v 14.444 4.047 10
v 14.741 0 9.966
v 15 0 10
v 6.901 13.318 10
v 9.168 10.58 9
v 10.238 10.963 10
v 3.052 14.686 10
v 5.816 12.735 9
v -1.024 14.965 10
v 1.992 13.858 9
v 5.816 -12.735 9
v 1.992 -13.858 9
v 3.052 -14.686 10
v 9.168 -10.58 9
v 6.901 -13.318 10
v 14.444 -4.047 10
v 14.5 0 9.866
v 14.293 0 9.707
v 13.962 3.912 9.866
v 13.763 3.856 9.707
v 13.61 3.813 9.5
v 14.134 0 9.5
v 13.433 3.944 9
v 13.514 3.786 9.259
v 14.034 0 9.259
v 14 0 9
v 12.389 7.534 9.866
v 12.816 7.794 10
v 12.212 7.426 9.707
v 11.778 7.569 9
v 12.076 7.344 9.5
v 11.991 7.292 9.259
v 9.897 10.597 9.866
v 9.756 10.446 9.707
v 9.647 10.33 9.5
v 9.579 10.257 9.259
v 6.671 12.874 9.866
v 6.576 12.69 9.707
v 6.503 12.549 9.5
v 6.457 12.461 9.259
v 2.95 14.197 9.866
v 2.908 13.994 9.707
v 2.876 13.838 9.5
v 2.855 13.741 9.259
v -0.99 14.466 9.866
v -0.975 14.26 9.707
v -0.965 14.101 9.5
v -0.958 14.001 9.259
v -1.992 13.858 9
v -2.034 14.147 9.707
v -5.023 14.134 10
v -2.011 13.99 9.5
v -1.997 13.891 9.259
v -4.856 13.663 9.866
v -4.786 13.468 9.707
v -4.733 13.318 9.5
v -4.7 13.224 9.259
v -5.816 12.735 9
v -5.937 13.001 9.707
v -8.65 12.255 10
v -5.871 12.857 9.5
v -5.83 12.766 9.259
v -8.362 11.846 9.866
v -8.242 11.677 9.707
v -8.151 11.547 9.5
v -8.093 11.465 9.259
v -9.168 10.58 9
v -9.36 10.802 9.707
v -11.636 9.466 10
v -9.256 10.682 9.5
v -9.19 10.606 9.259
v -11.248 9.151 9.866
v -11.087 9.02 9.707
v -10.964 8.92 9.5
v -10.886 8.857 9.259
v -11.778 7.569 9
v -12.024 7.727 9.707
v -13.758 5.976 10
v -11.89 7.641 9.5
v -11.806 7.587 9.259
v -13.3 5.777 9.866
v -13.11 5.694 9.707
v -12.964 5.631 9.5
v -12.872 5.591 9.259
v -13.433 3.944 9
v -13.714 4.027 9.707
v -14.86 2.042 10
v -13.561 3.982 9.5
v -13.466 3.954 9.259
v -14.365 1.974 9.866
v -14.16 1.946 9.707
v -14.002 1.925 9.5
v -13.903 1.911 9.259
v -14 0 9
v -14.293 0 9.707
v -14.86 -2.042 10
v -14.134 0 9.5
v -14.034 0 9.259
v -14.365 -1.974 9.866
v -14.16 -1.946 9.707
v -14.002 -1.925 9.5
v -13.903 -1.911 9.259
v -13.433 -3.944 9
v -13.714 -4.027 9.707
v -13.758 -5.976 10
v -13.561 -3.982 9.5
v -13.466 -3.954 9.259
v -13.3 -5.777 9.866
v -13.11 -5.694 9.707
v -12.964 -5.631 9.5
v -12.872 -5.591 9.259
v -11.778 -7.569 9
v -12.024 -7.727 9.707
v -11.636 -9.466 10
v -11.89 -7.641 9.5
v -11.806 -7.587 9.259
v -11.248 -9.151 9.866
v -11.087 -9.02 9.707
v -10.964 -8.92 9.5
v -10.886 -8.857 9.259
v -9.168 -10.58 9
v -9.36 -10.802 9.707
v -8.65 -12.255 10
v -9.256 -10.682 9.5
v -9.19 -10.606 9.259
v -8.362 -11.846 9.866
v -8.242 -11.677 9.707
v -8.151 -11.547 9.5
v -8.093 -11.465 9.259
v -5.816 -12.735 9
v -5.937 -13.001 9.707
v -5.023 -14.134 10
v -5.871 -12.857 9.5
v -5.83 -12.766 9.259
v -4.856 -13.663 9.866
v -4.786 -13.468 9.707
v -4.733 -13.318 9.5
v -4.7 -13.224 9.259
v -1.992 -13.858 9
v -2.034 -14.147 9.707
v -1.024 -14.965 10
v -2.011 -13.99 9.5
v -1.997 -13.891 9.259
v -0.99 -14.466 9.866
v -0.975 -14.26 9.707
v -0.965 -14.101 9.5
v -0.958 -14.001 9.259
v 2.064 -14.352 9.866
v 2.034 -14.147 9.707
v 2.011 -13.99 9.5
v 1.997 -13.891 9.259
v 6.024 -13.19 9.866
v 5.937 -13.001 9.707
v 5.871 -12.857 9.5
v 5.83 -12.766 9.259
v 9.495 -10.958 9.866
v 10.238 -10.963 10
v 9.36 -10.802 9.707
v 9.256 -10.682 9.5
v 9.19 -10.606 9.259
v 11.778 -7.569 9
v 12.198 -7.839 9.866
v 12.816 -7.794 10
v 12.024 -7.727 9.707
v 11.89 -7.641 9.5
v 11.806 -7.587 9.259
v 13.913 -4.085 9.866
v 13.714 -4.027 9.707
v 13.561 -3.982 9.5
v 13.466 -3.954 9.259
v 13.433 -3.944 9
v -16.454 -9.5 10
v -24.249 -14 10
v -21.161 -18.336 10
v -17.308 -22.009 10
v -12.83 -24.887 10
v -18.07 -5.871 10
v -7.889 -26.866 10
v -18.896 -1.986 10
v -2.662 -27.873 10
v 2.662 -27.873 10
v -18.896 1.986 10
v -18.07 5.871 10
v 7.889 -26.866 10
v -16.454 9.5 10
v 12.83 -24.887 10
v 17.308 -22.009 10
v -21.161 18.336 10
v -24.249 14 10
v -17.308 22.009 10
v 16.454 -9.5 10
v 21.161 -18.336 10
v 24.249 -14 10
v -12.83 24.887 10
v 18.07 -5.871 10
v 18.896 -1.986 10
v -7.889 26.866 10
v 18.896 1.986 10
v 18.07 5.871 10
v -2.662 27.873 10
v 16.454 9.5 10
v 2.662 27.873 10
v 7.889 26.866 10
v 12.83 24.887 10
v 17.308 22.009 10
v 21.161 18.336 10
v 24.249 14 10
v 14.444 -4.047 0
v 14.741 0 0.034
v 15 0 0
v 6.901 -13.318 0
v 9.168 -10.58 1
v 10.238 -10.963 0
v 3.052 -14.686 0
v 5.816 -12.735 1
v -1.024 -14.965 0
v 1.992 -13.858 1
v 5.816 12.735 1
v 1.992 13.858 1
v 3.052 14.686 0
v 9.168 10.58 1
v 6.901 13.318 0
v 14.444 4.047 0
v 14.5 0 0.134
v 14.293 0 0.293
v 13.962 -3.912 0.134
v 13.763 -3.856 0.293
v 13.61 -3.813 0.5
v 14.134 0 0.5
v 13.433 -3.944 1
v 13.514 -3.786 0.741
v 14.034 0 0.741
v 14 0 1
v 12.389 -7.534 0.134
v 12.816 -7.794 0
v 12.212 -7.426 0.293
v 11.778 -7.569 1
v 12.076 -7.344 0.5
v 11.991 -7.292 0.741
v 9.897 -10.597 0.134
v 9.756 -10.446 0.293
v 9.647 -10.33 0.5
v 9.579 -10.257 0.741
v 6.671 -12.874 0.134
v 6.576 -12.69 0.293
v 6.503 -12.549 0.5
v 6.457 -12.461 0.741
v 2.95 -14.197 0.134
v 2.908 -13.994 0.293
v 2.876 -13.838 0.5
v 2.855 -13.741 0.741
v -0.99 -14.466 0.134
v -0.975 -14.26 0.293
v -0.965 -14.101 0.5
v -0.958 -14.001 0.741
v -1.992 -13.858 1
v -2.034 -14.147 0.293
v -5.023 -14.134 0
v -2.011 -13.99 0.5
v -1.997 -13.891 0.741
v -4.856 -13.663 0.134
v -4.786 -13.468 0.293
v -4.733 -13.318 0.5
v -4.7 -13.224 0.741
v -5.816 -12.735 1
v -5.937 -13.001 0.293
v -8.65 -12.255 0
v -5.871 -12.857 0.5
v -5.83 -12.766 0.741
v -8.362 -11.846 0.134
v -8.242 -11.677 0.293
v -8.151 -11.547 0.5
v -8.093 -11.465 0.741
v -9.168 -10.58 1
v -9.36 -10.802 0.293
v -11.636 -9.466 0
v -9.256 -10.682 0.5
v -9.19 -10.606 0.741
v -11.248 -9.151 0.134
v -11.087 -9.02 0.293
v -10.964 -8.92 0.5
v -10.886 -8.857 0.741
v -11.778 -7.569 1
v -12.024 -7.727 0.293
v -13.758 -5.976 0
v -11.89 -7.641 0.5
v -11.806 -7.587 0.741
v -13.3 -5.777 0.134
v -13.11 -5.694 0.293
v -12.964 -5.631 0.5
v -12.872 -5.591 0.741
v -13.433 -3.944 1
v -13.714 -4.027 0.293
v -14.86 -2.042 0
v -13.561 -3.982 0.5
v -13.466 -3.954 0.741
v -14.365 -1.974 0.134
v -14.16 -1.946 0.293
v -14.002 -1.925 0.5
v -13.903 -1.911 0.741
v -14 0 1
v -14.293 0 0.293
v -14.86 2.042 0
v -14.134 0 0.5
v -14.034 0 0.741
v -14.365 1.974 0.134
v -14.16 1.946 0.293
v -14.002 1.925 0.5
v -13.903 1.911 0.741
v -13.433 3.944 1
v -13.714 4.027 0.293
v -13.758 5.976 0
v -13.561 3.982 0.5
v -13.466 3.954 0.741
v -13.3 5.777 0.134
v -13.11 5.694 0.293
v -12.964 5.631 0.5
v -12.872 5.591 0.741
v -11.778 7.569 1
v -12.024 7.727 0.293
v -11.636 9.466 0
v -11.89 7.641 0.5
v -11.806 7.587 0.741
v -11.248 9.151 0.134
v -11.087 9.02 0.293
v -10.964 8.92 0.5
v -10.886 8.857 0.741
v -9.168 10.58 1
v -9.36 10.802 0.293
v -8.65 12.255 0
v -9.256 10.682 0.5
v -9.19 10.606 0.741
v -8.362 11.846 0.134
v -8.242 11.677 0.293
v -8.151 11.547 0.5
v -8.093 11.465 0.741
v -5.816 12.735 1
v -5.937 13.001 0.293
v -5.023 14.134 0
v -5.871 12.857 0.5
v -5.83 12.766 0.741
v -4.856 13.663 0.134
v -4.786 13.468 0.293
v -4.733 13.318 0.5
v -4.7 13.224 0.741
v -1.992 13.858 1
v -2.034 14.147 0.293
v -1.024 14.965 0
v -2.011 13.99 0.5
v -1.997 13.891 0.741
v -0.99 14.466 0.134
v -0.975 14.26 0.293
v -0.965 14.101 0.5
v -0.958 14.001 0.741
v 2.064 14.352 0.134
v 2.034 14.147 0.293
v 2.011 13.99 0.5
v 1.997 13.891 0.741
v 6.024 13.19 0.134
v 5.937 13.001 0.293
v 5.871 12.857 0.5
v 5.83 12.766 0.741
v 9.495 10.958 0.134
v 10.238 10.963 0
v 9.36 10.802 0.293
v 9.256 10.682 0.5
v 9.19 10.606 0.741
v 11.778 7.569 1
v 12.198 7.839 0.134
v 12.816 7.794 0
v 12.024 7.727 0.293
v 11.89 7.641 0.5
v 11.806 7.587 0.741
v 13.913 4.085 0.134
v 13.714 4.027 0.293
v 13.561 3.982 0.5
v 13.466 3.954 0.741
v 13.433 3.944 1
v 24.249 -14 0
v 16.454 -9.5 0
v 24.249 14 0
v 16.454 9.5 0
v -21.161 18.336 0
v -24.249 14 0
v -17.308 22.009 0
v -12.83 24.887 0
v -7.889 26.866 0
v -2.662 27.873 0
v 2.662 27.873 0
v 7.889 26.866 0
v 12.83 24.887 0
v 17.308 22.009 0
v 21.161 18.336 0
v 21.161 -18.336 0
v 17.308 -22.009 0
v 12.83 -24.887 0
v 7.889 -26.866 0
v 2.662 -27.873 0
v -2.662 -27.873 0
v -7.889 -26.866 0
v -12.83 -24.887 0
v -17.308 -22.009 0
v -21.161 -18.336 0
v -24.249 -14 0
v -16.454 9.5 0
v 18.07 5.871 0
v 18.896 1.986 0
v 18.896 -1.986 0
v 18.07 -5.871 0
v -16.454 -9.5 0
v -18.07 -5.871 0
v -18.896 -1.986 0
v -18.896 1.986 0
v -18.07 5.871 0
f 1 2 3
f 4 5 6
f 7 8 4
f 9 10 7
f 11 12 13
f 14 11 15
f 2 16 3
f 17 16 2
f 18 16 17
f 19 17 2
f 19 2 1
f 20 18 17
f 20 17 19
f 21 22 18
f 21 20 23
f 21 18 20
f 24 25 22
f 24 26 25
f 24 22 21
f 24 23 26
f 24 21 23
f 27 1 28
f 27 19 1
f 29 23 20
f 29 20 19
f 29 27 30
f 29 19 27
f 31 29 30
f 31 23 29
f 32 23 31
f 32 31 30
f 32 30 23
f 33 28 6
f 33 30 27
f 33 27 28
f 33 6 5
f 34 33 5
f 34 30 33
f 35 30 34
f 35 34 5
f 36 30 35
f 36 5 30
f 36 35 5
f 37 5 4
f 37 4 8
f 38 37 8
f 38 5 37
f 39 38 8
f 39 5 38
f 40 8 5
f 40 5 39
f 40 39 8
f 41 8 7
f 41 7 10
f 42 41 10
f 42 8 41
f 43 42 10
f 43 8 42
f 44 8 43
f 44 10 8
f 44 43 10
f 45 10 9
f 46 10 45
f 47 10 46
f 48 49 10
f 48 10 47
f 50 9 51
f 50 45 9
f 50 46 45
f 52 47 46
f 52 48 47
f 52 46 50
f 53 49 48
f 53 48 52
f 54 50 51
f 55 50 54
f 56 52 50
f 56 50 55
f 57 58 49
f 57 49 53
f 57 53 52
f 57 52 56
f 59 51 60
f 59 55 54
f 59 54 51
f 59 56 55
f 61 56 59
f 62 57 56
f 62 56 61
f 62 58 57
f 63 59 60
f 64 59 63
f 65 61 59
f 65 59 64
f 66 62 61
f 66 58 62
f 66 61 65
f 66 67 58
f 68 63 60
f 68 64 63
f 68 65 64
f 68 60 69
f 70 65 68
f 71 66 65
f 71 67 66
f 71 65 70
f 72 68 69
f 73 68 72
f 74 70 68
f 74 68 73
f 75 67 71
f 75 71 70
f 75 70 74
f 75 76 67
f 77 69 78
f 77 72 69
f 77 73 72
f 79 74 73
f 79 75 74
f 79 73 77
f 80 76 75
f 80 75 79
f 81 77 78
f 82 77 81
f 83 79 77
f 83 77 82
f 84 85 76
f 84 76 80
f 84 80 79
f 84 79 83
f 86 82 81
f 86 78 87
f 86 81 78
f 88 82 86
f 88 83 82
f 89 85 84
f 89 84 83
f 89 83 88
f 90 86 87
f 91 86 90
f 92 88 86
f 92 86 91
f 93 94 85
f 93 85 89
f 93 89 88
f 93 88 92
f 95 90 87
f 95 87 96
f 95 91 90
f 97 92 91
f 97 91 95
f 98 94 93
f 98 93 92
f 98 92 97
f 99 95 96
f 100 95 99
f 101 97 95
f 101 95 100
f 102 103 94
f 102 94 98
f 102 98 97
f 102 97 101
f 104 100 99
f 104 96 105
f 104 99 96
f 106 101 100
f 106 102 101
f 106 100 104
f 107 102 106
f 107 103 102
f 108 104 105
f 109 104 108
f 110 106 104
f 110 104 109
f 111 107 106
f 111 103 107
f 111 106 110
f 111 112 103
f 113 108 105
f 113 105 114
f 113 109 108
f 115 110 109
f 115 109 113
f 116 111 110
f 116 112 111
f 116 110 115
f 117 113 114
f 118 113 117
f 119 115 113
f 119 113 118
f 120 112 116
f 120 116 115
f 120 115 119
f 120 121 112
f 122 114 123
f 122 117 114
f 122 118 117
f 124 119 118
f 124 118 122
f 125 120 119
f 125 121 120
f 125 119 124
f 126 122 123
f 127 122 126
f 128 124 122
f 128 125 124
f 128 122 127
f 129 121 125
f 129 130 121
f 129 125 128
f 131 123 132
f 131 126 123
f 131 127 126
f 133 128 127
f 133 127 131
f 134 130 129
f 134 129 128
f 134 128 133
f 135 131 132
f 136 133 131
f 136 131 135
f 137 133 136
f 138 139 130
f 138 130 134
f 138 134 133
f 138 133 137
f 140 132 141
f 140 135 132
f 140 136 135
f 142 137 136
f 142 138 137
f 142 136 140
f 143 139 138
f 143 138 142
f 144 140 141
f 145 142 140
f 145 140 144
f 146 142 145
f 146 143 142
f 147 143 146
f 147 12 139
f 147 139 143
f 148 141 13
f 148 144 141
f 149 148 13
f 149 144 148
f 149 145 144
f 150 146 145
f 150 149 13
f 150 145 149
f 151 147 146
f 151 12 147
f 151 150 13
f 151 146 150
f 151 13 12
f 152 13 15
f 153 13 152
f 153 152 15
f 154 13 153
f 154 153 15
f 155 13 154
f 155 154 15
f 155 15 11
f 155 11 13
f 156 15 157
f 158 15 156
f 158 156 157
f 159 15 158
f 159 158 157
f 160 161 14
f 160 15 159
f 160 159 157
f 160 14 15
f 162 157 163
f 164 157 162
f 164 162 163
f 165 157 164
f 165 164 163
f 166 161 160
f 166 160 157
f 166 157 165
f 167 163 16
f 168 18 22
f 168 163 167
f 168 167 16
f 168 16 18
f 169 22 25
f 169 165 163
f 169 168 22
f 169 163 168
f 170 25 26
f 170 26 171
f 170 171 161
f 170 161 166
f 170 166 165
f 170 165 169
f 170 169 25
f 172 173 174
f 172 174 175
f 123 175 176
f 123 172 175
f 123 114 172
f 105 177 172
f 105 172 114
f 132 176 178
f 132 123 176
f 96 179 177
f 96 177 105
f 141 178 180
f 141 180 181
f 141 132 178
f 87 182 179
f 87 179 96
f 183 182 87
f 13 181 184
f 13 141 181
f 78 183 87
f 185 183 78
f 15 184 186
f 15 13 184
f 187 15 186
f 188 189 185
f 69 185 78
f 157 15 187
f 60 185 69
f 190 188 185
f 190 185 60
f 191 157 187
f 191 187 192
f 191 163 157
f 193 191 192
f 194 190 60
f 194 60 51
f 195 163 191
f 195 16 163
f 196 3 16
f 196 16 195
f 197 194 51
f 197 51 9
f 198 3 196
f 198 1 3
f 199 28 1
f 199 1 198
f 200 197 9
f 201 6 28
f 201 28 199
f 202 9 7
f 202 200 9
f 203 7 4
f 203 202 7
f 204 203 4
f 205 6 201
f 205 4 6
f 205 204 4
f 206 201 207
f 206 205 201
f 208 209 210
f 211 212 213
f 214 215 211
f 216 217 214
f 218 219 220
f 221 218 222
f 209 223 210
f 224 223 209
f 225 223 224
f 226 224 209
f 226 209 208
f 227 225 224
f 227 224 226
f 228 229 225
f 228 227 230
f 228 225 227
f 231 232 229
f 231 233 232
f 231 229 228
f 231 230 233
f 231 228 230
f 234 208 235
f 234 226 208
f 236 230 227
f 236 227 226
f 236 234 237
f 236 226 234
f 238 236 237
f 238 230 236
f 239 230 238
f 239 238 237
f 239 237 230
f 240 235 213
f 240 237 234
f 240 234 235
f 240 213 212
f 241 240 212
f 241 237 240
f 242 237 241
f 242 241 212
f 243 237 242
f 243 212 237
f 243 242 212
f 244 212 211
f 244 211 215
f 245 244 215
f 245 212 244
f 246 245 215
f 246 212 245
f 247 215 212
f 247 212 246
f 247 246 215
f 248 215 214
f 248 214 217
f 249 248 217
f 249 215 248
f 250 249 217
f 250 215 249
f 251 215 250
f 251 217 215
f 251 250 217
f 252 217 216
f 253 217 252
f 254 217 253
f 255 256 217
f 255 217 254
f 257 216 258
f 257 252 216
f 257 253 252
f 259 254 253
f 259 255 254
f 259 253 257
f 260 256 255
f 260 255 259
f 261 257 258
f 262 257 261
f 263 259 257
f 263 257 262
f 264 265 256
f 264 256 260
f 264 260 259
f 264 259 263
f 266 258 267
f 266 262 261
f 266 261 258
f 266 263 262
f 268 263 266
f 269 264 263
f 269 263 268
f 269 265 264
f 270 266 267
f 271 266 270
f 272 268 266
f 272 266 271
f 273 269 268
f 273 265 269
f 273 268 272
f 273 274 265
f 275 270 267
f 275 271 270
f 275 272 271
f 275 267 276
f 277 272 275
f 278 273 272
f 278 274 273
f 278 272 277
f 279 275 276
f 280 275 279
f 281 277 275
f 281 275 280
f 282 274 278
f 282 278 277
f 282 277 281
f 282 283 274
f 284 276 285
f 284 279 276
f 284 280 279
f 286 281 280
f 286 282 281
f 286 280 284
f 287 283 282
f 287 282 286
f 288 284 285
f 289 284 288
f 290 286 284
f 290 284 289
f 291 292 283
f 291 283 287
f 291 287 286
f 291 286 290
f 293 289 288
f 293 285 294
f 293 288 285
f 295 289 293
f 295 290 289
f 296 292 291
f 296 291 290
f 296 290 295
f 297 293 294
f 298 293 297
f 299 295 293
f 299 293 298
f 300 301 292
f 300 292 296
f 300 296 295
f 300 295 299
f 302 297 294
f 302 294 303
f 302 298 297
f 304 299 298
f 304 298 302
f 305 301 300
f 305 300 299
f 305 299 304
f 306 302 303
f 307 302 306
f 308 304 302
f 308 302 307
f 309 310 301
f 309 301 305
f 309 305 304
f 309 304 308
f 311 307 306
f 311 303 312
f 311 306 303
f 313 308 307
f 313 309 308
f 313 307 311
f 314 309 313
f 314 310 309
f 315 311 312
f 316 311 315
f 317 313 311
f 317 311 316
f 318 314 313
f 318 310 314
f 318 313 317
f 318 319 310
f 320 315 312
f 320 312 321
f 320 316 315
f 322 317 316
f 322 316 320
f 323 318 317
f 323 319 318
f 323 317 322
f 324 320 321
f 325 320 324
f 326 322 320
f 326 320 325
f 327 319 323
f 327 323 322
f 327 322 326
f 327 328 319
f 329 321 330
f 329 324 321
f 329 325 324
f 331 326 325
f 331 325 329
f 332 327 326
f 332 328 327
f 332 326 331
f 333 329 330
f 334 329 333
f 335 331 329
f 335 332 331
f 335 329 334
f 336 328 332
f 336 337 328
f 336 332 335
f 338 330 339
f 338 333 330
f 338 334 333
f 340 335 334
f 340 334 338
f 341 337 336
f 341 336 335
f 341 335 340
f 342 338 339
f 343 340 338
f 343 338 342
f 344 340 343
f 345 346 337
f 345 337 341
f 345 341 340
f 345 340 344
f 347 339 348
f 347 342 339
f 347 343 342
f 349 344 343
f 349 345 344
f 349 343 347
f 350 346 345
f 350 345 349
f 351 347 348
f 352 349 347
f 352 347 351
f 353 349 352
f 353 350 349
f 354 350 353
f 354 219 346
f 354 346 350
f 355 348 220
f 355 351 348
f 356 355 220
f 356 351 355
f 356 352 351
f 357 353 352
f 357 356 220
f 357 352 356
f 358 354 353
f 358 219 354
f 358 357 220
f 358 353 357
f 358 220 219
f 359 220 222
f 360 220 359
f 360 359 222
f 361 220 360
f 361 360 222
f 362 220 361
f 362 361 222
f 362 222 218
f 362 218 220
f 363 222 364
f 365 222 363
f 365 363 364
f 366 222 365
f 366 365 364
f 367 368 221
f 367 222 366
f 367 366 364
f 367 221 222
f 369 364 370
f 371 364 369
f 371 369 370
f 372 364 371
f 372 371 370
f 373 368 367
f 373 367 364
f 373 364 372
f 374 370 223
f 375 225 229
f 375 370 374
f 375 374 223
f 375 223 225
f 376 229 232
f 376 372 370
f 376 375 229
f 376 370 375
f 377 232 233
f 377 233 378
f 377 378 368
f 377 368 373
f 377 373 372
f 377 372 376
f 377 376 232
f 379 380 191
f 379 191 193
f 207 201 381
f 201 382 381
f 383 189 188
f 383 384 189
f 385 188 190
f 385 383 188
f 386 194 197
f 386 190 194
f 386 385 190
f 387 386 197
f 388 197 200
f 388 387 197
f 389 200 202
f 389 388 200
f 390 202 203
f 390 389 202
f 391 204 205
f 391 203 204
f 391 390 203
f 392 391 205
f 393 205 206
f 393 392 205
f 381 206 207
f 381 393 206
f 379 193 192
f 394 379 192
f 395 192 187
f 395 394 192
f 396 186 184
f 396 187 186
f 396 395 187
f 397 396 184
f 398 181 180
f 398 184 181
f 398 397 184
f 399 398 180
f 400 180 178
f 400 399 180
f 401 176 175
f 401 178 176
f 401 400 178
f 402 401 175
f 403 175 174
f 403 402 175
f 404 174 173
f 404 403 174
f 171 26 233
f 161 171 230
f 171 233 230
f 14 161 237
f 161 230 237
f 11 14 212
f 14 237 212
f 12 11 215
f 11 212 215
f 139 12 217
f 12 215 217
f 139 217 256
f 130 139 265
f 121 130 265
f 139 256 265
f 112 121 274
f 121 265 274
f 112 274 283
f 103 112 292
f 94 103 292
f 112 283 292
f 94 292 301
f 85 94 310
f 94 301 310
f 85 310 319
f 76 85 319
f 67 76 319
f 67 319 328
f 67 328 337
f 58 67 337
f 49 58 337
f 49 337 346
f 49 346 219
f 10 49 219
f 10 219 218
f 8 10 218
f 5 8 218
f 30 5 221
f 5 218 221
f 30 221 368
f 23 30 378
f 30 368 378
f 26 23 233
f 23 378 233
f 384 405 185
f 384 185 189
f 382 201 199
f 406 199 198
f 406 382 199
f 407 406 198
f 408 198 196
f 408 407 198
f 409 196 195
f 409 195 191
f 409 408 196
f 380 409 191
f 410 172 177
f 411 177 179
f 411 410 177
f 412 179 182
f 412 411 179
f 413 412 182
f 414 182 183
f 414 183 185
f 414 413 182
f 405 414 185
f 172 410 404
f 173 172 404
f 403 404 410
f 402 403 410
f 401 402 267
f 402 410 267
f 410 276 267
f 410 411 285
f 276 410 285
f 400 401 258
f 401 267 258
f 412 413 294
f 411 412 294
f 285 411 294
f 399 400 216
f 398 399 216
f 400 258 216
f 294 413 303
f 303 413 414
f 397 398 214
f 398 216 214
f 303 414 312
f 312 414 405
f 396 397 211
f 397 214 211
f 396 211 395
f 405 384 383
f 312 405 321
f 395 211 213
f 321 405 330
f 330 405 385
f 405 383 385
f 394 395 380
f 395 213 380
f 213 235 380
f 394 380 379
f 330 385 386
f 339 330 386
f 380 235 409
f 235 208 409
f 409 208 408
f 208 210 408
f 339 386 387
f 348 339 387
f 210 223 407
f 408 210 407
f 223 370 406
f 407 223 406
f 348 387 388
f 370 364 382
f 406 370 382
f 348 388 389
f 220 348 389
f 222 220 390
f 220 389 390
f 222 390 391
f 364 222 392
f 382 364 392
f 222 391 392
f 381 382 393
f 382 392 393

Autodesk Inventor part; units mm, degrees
ref_plane "YZ Plane" through (0, 0, 0) normal (1, 0, 0) x (0, 1, 0)
ref_plane "XZ Plane" through (0, 0, 0) normal (0, 1, 0) x (-1, 0, 0)
ref_plane "XY Plane" through (0, 0, 0) normal (0, 0, 1) x (1, 0, 0)
sketch "Sketch1" plane through (0, 0, 0) normal (0, 0, 1) x (1, 0, 0)
  circle A0 centre (0, 0) radius 28
  circle A1 centre (0, 0) radius 14
  circle A2 centre (0, 0) radius 19
  line L0 (0, 0) -> (-24.2487, 14)
  line L1 (0, 0) -> (24.2487, 14)
  line L2 (0, 0) -> (6.8345, 0)
  line L3 (0, 0) -> (24.2487, -14)
  line L4 (0, 0) -> (-24.2487, -14)
  point P0 (-16.4545, 9.5)
  point P1 (16.4545, 9.5)
  point P2 (-16.4545, -9.5)
  point P3 (16.4545, -9.5)
  dimension "d0" = 56
  dimension "d1" = 28
  dimension "d2" = 5
  dimension "d3" = 120
  dimension "d4" = 30
  dimension "d8" = 120
  dimension "d9" = 60
extrude "Extrusion1" add sketch "Sketch1" along normal blind 10 contours L1 A2 L0 A0 | L1 A1 L0 A2 | A2 L3 A1 L1 | A2 L4 A1 L3 | L0 A1 L4 A2
fillet "Fillet1" radius 1 2 edges at (-14, 0, 0) (-14, 0, 10)
extrude "Extrusion2" add sketch "Sketch1" along normal blind 10 contours A0 L4 A2 L3
properties part number "soporte bomba"
